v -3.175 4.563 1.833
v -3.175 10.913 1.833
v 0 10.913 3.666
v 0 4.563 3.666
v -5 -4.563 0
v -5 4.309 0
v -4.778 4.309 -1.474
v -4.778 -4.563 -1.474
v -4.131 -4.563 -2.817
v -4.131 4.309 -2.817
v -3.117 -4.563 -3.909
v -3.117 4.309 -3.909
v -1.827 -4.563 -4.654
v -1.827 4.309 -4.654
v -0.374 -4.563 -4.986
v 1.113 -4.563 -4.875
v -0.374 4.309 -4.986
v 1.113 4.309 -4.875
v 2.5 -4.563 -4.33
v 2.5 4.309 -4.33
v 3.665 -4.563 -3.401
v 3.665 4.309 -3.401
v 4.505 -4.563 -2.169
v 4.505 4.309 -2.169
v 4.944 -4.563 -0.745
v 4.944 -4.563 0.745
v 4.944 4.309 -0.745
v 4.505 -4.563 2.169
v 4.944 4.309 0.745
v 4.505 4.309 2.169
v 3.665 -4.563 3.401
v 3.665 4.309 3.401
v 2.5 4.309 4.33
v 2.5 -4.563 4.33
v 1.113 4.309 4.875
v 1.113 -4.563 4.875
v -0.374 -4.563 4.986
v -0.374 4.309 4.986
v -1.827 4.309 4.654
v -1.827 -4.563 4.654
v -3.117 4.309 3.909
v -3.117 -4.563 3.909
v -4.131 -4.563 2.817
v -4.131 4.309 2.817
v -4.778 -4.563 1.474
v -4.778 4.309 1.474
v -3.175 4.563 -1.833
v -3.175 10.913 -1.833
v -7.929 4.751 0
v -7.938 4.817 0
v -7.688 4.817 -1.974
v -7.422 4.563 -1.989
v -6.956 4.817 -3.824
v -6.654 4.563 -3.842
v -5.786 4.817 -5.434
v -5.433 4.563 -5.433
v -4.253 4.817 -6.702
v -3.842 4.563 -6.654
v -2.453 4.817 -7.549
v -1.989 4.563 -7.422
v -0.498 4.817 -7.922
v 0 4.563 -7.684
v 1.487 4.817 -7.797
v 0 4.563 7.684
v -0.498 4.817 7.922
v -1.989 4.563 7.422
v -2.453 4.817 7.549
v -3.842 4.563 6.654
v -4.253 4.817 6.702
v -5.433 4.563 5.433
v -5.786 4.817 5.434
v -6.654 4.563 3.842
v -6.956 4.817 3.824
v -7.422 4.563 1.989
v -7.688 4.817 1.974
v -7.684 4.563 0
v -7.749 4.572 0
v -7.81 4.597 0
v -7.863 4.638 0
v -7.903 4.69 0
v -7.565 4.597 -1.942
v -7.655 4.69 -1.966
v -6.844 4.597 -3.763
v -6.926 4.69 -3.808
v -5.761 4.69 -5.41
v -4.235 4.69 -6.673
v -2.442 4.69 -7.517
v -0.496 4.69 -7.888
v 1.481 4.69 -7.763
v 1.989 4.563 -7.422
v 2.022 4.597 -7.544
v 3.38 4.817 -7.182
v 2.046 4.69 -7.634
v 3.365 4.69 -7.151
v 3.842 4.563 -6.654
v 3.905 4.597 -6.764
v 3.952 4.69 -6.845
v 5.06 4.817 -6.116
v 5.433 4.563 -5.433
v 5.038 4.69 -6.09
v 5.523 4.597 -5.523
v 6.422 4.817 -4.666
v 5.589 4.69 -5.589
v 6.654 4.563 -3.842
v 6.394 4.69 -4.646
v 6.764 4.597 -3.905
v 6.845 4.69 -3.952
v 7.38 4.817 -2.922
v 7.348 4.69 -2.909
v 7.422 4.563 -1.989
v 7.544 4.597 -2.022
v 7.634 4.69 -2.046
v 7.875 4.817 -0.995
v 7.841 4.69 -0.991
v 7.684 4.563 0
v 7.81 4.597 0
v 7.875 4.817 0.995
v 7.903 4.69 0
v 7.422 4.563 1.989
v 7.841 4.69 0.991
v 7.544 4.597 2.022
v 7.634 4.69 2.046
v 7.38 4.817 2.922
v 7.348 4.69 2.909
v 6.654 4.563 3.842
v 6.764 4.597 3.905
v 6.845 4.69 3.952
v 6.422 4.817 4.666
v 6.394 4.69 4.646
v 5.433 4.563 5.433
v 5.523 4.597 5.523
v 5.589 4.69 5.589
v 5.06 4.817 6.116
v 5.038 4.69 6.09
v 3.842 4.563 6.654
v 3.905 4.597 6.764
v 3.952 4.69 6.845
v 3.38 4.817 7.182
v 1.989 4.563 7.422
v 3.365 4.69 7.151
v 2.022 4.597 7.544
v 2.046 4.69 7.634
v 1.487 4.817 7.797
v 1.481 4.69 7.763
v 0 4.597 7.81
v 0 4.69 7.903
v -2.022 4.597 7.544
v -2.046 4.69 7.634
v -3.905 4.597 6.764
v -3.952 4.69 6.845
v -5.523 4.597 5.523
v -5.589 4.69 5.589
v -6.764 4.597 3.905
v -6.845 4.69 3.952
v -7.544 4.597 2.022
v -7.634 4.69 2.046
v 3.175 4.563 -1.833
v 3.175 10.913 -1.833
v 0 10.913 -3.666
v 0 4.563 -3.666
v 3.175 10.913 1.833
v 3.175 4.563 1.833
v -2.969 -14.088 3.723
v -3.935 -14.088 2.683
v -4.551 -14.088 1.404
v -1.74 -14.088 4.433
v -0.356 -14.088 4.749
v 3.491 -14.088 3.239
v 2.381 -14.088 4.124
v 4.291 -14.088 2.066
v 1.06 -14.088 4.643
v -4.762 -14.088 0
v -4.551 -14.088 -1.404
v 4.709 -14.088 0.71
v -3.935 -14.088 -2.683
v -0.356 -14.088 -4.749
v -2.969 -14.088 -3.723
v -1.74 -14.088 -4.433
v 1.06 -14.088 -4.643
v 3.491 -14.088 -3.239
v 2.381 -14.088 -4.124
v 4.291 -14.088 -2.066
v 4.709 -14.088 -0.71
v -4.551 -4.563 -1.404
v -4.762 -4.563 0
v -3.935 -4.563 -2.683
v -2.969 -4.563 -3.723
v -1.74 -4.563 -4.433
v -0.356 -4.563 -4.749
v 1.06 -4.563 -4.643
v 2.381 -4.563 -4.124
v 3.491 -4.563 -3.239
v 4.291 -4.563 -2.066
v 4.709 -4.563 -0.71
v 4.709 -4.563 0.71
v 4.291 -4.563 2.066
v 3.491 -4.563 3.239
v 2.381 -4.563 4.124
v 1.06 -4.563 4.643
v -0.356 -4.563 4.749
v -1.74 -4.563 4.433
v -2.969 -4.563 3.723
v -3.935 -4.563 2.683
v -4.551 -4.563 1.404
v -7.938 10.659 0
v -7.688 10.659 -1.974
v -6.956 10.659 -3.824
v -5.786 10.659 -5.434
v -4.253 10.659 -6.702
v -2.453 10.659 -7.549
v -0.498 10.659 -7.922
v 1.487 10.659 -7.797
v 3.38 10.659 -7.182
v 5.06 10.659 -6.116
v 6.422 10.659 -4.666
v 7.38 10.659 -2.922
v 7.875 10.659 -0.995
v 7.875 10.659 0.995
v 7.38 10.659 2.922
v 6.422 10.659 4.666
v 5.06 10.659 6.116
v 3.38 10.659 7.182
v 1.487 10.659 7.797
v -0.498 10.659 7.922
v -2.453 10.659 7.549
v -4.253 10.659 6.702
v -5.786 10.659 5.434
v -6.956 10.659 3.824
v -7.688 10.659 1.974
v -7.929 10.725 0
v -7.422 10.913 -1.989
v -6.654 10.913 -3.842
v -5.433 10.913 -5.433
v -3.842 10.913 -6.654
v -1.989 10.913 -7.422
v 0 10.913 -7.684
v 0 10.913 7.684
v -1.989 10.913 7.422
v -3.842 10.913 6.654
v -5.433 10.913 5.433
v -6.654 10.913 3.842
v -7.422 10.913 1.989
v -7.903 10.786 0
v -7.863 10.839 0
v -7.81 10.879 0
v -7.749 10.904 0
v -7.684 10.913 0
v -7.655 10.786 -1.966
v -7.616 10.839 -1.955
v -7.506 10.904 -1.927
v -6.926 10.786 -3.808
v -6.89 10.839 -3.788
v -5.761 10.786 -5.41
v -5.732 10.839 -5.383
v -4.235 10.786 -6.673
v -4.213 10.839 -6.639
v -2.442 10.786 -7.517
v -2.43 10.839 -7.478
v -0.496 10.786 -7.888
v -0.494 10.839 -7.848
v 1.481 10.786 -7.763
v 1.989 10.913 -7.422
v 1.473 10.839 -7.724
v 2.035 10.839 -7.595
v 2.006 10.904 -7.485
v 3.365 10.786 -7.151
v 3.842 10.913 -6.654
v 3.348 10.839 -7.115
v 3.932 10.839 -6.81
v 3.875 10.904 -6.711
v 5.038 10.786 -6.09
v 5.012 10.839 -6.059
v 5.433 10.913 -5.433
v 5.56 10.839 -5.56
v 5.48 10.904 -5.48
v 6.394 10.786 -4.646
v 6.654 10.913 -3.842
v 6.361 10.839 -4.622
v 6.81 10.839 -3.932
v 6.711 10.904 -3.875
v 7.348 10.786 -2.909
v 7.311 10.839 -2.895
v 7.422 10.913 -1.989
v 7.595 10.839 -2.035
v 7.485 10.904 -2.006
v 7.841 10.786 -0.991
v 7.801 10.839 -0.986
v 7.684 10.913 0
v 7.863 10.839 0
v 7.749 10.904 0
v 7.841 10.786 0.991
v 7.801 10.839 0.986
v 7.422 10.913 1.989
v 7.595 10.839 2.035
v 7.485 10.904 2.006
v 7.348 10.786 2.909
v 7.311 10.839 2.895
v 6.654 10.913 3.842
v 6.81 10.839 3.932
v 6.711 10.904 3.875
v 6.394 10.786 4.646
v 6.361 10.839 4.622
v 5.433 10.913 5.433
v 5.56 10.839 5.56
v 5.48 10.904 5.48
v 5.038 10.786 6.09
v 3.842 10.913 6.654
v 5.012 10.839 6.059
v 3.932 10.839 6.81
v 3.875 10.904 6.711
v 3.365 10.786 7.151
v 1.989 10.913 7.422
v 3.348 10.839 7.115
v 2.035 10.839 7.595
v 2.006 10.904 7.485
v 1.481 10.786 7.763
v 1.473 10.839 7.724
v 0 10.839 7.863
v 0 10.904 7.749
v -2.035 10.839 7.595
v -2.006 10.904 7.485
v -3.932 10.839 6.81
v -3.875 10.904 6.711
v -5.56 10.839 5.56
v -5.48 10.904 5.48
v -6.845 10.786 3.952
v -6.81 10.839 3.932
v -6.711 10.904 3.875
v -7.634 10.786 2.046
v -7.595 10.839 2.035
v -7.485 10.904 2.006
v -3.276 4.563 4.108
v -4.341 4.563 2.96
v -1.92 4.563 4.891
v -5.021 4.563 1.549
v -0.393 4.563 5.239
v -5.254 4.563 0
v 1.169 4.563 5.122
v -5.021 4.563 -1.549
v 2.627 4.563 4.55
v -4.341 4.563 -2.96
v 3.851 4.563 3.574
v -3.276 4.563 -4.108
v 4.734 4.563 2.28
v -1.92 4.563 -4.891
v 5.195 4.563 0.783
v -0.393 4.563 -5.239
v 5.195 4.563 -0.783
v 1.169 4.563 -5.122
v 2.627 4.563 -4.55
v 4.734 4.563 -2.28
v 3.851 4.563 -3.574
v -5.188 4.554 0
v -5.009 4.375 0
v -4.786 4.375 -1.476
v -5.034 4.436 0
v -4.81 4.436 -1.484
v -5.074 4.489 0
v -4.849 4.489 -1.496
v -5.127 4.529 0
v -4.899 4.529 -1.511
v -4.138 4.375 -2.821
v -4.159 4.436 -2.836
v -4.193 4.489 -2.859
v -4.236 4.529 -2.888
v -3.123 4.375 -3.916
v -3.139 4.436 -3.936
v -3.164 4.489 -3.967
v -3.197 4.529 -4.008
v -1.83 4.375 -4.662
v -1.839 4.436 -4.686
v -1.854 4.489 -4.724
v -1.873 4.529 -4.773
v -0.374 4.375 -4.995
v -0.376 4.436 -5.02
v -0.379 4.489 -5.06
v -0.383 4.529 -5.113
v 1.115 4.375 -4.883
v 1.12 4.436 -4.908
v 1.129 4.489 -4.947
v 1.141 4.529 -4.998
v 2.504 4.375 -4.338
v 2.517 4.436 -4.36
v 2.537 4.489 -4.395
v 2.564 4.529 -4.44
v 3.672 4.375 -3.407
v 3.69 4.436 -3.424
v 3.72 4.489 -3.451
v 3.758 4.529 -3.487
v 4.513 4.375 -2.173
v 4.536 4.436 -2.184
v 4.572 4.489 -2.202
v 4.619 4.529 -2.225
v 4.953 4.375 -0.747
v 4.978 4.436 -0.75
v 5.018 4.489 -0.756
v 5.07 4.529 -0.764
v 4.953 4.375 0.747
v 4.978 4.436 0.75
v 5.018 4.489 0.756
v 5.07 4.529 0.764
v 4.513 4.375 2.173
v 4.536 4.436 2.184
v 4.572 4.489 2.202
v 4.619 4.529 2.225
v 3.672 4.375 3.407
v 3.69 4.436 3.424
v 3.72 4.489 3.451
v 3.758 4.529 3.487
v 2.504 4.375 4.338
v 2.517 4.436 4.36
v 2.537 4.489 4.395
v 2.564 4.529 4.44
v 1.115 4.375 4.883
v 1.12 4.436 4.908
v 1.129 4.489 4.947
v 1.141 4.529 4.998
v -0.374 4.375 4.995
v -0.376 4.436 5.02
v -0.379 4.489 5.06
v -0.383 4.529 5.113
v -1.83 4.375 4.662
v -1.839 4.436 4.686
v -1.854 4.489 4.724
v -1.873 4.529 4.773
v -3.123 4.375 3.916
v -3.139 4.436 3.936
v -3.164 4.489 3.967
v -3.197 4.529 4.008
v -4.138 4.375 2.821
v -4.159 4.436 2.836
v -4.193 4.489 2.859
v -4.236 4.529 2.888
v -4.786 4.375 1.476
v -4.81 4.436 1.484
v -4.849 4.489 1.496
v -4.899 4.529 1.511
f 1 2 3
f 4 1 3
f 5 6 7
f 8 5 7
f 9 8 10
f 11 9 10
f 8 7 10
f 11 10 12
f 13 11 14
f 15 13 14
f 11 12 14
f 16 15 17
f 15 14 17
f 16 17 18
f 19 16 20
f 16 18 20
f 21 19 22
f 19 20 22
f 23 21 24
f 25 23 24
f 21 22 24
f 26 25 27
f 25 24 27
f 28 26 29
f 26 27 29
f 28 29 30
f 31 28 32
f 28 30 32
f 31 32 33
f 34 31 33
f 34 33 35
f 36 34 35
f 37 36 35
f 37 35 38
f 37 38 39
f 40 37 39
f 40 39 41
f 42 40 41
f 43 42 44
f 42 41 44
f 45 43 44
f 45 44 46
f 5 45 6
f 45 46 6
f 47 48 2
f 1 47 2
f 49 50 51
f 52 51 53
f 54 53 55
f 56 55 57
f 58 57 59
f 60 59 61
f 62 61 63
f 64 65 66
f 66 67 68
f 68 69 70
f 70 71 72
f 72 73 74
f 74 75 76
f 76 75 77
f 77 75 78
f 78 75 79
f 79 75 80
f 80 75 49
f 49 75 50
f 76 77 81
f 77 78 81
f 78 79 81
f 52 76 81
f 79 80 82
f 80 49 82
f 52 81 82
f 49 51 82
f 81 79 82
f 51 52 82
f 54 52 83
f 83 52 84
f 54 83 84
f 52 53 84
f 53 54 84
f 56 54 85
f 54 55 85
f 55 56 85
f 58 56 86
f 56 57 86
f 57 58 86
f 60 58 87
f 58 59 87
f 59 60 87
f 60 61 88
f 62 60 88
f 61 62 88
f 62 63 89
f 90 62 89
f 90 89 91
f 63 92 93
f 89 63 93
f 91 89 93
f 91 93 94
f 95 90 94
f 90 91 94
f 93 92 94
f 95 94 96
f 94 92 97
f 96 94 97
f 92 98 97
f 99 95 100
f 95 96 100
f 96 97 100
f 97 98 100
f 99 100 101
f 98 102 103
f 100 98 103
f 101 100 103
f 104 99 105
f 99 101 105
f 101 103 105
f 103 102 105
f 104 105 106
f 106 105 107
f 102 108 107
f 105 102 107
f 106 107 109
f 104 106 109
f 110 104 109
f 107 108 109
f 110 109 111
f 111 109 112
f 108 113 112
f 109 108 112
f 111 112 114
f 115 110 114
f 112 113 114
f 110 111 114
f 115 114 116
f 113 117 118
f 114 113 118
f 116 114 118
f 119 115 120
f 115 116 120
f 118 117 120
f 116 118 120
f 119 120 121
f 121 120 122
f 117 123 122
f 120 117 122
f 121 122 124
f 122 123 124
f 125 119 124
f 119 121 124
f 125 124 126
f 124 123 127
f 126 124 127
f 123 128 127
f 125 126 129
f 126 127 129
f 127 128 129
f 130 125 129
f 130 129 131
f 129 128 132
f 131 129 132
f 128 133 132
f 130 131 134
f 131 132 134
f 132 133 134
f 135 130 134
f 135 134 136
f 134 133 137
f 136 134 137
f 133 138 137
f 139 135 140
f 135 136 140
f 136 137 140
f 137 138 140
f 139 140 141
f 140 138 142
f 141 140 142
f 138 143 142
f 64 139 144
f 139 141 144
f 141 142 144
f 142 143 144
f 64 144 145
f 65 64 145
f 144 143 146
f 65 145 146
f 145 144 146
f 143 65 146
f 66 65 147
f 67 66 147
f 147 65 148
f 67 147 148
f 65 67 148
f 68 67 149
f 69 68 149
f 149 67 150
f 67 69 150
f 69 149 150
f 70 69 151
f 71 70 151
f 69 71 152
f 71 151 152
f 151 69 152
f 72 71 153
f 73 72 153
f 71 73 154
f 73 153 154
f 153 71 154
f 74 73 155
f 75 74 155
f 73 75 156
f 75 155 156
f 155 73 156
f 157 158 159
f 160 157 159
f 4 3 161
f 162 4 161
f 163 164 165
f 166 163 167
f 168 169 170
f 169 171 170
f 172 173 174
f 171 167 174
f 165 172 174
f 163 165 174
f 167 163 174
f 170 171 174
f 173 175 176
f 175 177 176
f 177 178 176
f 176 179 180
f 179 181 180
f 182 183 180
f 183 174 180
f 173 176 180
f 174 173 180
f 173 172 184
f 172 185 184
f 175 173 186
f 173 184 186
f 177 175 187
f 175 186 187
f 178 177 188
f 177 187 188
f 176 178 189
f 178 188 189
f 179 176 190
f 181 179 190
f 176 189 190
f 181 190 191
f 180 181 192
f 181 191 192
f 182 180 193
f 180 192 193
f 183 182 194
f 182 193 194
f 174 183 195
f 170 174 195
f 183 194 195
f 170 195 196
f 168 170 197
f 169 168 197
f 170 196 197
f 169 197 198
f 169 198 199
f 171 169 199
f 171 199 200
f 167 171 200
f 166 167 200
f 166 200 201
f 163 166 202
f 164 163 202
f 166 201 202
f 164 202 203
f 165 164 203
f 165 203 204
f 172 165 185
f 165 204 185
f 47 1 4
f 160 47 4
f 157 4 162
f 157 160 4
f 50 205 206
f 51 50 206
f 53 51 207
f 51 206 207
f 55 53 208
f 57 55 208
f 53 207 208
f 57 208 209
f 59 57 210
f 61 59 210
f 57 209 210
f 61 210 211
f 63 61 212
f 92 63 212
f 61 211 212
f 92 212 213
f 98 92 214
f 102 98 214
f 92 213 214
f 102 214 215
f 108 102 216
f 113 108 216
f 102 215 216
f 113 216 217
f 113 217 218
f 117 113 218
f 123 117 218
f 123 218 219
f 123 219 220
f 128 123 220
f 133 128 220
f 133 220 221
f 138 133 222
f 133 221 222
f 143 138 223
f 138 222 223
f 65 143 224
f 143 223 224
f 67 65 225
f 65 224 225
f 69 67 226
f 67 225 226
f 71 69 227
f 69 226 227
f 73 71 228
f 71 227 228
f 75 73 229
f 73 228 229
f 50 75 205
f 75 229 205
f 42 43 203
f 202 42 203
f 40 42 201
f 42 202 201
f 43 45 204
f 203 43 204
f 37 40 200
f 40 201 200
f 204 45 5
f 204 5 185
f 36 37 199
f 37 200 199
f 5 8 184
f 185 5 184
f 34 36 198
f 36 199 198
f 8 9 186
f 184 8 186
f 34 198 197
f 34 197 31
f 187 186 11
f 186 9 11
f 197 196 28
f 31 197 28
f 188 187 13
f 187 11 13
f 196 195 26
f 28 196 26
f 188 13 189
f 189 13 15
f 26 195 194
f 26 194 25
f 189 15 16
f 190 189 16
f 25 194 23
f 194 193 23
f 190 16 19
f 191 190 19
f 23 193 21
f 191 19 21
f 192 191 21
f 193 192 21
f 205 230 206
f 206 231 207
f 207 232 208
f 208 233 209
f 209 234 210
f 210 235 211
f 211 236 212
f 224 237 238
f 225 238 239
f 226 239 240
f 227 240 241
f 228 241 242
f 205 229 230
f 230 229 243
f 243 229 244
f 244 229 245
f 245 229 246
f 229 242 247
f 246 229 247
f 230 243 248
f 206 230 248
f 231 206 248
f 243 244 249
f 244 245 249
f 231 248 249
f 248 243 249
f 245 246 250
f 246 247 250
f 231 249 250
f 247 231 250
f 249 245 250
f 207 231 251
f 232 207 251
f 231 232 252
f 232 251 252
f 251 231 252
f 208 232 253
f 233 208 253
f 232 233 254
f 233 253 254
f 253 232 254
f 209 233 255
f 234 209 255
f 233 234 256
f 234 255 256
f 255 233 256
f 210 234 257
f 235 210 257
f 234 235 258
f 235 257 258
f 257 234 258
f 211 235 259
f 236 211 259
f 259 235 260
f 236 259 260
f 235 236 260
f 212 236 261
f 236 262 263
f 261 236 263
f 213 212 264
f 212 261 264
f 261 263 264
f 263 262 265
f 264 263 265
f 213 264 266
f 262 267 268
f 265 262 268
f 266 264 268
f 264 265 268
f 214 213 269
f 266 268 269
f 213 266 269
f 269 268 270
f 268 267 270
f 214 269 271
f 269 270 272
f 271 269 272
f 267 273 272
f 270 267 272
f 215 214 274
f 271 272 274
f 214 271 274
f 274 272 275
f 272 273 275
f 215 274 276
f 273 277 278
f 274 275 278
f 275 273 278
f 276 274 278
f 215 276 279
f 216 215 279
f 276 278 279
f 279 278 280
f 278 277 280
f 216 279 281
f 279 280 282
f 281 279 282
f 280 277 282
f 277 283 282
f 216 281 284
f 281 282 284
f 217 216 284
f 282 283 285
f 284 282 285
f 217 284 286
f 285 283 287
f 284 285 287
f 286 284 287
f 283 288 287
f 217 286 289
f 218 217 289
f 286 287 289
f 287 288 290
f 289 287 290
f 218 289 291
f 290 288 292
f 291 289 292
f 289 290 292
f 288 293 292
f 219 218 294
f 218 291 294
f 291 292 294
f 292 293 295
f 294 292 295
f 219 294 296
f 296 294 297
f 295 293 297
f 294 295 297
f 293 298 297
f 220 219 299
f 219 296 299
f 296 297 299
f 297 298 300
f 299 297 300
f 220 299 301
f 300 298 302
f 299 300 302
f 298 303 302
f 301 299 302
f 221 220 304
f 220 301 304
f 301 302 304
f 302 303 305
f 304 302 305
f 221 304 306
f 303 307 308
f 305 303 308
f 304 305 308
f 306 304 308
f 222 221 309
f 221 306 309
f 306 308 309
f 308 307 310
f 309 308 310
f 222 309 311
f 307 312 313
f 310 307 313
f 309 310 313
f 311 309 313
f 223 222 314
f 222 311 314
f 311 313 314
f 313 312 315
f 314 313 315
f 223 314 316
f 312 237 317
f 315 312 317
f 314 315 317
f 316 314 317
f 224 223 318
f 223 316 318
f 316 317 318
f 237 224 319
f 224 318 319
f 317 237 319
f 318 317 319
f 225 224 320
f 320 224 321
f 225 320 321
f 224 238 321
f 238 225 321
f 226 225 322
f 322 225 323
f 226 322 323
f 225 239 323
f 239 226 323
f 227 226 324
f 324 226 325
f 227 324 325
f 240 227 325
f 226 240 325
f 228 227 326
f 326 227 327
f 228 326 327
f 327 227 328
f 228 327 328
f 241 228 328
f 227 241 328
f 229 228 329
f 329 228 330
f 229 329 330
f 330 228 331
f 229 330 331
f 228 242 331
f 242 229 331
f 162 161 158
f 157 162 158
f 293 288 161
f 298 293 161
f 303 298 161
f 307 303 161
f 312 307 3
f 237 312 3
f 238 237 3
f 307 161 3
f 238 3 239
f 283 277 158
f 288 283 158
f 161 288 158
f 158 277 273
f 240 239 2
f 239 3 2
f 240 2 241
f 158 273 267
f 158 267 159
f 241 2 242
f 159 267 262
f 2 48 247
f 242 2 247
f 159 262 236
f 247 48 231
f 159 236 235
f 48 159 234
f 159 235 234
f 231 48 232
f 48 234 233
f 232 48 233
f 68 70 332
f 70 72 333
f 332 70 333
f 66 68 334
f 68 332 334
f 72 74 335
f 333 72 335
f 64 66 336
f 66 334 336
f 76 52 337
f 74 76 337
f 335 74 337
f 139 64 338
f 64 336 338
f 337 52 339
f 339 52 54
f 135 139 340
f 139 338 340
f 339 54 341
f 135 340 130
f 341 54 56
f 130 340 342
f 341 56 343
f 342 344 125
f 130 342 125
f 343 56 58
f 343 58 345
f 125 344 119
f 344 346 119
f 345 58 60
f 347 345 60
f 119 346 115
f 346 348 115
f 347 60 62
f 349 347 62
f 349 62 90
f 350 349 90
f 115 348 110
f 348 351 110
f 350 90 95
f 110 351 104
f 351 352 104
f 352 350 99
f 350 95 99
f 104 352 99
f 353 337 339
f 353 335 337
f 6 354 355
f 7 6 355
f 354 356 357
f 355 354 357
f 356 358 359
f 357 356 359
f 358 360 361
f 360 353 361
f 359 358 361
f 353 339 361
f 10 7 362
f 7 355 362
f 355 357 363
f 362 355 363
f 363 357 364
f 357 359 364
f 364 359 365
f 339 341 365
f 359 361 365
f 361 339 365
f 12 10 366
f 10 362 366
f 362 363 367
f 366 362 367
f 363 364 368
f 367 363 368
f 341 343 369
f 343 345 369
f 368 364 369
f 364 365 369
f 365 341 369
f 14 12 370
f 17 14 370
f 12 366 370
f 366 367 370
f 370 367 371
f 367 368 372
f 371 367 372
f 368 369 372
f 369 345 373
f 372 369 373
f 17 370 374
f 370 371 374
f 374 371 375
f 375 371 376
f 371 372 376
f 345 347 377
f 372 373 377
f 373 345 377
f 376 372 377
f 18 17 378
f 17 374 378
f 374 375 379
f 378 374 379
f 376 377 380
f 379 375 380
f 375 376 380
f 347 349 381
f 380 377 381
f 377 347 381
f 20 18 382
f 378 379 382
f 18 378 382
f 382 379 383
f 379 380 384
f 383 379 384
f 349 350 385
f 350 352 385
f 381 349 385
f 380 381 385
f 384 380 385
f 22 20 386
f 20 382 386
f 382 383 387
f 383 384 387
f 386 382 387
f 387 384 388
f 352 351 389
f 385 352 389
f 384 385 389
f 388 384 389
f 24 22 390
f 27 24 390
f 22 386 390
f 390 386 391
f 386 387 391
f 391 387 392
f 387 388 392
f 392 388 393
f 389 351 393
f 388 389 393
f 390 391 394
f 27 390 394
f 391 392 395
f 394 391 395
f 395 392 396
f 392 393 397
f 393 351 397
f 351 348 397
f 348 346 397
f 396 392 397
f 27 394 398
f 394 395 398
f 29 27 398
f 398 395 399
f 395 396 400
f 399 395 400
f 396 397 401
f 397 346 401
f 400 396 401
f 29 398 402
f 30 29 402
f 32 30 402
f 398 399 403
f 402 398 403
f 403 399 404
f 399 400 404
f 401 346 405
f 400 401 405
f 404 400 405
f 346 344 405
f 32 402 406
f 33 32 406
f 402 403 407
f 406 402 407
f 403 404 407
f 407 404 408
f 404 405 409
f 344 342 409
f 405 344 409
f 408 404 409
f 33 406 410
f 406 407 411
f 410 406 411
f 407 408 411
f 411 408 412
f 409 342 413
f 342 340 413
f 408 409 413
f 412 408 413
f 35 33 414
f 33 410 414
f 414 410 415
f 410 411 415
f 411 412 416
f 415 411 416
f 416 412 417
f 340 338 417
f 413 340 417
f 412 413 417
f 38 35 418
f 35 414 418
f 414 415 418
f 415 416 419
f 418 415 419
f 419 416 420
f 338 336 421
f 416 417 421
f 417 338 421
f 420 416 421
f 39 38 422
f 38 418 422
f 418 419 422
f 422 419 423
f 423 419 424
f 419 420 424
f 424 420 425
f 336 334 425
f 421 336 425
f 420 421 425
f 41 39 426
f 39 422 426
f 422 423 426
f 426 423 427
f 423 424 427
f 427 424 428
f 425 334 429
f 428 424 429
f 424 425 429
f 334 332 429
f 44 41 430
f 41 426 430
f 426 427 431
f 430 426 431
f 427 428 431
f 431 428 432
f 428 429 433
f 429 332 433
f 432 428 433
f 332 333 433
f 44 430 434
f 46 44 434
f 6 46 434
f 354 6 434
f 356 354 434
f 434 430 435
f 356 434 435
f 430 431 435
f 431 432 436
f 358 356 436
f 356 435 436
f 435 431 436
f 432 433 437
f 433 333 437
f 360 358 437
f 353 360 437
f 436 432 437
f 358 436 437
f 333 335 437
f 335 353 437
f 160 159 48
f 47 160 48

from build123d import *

# Parameters (mm, degrees)
CUT_EXTRUDE1_DEPTH = 6.35
FILLET1_R          = 0.254
FILLET2_R          = 0.254


with BuildPart() as part:
    # Sketch1 → Revolve1 (revolve)
    with BuildSketch(Plane.XY):
        Polygon((4.7625, -4.56311), (5, -4.56311), (5, 4.56311), (7.9375, 4.56311), (7.9375, 10.91311), (0, 10.91311), (0, -14.08811), (4.7625, -14.08811), align=None)
    revolve(axis=Axis((0, -16.678845395, 0), (0, -1, 0)))

    # Sketch2 → Cut-Extrude1 (cut)
    with BuildSketch(Plane(origin=(0, 10.91311, 0), x_dir=(1, 0, 0), z_dir=(0, 1, 0))):
        Polygon((0, 3.666174209), (-3.175, 1.833087105), (-3.175, -1.833087105), (0, -3.666174209), (3.175, -1.833087105), (3.175, 1.833087105), align=None)
    extrude(amount=-CUT_EXTRUDE1_DEPTH, mode=Mode.SUBTRACT)

    # Fillet1
    fillet1_edges = [part.edges().sort_by_distance(p)[0] for p in [
        (-5, 4.56311, 0),
    ]]
    fillet(fillet1_edges, radius=FILLET1_R)

    # Fillet2
    fillet2_edges = [part.edges().sort_by_distance(p)[0] for p in [
        (-7.9375, 10.91311, 0),
        (-7.9375, 4.56311, 0),
    ]]
    fillet(fillet2_edges, radius=FILLET2_R)


solid = part.part
